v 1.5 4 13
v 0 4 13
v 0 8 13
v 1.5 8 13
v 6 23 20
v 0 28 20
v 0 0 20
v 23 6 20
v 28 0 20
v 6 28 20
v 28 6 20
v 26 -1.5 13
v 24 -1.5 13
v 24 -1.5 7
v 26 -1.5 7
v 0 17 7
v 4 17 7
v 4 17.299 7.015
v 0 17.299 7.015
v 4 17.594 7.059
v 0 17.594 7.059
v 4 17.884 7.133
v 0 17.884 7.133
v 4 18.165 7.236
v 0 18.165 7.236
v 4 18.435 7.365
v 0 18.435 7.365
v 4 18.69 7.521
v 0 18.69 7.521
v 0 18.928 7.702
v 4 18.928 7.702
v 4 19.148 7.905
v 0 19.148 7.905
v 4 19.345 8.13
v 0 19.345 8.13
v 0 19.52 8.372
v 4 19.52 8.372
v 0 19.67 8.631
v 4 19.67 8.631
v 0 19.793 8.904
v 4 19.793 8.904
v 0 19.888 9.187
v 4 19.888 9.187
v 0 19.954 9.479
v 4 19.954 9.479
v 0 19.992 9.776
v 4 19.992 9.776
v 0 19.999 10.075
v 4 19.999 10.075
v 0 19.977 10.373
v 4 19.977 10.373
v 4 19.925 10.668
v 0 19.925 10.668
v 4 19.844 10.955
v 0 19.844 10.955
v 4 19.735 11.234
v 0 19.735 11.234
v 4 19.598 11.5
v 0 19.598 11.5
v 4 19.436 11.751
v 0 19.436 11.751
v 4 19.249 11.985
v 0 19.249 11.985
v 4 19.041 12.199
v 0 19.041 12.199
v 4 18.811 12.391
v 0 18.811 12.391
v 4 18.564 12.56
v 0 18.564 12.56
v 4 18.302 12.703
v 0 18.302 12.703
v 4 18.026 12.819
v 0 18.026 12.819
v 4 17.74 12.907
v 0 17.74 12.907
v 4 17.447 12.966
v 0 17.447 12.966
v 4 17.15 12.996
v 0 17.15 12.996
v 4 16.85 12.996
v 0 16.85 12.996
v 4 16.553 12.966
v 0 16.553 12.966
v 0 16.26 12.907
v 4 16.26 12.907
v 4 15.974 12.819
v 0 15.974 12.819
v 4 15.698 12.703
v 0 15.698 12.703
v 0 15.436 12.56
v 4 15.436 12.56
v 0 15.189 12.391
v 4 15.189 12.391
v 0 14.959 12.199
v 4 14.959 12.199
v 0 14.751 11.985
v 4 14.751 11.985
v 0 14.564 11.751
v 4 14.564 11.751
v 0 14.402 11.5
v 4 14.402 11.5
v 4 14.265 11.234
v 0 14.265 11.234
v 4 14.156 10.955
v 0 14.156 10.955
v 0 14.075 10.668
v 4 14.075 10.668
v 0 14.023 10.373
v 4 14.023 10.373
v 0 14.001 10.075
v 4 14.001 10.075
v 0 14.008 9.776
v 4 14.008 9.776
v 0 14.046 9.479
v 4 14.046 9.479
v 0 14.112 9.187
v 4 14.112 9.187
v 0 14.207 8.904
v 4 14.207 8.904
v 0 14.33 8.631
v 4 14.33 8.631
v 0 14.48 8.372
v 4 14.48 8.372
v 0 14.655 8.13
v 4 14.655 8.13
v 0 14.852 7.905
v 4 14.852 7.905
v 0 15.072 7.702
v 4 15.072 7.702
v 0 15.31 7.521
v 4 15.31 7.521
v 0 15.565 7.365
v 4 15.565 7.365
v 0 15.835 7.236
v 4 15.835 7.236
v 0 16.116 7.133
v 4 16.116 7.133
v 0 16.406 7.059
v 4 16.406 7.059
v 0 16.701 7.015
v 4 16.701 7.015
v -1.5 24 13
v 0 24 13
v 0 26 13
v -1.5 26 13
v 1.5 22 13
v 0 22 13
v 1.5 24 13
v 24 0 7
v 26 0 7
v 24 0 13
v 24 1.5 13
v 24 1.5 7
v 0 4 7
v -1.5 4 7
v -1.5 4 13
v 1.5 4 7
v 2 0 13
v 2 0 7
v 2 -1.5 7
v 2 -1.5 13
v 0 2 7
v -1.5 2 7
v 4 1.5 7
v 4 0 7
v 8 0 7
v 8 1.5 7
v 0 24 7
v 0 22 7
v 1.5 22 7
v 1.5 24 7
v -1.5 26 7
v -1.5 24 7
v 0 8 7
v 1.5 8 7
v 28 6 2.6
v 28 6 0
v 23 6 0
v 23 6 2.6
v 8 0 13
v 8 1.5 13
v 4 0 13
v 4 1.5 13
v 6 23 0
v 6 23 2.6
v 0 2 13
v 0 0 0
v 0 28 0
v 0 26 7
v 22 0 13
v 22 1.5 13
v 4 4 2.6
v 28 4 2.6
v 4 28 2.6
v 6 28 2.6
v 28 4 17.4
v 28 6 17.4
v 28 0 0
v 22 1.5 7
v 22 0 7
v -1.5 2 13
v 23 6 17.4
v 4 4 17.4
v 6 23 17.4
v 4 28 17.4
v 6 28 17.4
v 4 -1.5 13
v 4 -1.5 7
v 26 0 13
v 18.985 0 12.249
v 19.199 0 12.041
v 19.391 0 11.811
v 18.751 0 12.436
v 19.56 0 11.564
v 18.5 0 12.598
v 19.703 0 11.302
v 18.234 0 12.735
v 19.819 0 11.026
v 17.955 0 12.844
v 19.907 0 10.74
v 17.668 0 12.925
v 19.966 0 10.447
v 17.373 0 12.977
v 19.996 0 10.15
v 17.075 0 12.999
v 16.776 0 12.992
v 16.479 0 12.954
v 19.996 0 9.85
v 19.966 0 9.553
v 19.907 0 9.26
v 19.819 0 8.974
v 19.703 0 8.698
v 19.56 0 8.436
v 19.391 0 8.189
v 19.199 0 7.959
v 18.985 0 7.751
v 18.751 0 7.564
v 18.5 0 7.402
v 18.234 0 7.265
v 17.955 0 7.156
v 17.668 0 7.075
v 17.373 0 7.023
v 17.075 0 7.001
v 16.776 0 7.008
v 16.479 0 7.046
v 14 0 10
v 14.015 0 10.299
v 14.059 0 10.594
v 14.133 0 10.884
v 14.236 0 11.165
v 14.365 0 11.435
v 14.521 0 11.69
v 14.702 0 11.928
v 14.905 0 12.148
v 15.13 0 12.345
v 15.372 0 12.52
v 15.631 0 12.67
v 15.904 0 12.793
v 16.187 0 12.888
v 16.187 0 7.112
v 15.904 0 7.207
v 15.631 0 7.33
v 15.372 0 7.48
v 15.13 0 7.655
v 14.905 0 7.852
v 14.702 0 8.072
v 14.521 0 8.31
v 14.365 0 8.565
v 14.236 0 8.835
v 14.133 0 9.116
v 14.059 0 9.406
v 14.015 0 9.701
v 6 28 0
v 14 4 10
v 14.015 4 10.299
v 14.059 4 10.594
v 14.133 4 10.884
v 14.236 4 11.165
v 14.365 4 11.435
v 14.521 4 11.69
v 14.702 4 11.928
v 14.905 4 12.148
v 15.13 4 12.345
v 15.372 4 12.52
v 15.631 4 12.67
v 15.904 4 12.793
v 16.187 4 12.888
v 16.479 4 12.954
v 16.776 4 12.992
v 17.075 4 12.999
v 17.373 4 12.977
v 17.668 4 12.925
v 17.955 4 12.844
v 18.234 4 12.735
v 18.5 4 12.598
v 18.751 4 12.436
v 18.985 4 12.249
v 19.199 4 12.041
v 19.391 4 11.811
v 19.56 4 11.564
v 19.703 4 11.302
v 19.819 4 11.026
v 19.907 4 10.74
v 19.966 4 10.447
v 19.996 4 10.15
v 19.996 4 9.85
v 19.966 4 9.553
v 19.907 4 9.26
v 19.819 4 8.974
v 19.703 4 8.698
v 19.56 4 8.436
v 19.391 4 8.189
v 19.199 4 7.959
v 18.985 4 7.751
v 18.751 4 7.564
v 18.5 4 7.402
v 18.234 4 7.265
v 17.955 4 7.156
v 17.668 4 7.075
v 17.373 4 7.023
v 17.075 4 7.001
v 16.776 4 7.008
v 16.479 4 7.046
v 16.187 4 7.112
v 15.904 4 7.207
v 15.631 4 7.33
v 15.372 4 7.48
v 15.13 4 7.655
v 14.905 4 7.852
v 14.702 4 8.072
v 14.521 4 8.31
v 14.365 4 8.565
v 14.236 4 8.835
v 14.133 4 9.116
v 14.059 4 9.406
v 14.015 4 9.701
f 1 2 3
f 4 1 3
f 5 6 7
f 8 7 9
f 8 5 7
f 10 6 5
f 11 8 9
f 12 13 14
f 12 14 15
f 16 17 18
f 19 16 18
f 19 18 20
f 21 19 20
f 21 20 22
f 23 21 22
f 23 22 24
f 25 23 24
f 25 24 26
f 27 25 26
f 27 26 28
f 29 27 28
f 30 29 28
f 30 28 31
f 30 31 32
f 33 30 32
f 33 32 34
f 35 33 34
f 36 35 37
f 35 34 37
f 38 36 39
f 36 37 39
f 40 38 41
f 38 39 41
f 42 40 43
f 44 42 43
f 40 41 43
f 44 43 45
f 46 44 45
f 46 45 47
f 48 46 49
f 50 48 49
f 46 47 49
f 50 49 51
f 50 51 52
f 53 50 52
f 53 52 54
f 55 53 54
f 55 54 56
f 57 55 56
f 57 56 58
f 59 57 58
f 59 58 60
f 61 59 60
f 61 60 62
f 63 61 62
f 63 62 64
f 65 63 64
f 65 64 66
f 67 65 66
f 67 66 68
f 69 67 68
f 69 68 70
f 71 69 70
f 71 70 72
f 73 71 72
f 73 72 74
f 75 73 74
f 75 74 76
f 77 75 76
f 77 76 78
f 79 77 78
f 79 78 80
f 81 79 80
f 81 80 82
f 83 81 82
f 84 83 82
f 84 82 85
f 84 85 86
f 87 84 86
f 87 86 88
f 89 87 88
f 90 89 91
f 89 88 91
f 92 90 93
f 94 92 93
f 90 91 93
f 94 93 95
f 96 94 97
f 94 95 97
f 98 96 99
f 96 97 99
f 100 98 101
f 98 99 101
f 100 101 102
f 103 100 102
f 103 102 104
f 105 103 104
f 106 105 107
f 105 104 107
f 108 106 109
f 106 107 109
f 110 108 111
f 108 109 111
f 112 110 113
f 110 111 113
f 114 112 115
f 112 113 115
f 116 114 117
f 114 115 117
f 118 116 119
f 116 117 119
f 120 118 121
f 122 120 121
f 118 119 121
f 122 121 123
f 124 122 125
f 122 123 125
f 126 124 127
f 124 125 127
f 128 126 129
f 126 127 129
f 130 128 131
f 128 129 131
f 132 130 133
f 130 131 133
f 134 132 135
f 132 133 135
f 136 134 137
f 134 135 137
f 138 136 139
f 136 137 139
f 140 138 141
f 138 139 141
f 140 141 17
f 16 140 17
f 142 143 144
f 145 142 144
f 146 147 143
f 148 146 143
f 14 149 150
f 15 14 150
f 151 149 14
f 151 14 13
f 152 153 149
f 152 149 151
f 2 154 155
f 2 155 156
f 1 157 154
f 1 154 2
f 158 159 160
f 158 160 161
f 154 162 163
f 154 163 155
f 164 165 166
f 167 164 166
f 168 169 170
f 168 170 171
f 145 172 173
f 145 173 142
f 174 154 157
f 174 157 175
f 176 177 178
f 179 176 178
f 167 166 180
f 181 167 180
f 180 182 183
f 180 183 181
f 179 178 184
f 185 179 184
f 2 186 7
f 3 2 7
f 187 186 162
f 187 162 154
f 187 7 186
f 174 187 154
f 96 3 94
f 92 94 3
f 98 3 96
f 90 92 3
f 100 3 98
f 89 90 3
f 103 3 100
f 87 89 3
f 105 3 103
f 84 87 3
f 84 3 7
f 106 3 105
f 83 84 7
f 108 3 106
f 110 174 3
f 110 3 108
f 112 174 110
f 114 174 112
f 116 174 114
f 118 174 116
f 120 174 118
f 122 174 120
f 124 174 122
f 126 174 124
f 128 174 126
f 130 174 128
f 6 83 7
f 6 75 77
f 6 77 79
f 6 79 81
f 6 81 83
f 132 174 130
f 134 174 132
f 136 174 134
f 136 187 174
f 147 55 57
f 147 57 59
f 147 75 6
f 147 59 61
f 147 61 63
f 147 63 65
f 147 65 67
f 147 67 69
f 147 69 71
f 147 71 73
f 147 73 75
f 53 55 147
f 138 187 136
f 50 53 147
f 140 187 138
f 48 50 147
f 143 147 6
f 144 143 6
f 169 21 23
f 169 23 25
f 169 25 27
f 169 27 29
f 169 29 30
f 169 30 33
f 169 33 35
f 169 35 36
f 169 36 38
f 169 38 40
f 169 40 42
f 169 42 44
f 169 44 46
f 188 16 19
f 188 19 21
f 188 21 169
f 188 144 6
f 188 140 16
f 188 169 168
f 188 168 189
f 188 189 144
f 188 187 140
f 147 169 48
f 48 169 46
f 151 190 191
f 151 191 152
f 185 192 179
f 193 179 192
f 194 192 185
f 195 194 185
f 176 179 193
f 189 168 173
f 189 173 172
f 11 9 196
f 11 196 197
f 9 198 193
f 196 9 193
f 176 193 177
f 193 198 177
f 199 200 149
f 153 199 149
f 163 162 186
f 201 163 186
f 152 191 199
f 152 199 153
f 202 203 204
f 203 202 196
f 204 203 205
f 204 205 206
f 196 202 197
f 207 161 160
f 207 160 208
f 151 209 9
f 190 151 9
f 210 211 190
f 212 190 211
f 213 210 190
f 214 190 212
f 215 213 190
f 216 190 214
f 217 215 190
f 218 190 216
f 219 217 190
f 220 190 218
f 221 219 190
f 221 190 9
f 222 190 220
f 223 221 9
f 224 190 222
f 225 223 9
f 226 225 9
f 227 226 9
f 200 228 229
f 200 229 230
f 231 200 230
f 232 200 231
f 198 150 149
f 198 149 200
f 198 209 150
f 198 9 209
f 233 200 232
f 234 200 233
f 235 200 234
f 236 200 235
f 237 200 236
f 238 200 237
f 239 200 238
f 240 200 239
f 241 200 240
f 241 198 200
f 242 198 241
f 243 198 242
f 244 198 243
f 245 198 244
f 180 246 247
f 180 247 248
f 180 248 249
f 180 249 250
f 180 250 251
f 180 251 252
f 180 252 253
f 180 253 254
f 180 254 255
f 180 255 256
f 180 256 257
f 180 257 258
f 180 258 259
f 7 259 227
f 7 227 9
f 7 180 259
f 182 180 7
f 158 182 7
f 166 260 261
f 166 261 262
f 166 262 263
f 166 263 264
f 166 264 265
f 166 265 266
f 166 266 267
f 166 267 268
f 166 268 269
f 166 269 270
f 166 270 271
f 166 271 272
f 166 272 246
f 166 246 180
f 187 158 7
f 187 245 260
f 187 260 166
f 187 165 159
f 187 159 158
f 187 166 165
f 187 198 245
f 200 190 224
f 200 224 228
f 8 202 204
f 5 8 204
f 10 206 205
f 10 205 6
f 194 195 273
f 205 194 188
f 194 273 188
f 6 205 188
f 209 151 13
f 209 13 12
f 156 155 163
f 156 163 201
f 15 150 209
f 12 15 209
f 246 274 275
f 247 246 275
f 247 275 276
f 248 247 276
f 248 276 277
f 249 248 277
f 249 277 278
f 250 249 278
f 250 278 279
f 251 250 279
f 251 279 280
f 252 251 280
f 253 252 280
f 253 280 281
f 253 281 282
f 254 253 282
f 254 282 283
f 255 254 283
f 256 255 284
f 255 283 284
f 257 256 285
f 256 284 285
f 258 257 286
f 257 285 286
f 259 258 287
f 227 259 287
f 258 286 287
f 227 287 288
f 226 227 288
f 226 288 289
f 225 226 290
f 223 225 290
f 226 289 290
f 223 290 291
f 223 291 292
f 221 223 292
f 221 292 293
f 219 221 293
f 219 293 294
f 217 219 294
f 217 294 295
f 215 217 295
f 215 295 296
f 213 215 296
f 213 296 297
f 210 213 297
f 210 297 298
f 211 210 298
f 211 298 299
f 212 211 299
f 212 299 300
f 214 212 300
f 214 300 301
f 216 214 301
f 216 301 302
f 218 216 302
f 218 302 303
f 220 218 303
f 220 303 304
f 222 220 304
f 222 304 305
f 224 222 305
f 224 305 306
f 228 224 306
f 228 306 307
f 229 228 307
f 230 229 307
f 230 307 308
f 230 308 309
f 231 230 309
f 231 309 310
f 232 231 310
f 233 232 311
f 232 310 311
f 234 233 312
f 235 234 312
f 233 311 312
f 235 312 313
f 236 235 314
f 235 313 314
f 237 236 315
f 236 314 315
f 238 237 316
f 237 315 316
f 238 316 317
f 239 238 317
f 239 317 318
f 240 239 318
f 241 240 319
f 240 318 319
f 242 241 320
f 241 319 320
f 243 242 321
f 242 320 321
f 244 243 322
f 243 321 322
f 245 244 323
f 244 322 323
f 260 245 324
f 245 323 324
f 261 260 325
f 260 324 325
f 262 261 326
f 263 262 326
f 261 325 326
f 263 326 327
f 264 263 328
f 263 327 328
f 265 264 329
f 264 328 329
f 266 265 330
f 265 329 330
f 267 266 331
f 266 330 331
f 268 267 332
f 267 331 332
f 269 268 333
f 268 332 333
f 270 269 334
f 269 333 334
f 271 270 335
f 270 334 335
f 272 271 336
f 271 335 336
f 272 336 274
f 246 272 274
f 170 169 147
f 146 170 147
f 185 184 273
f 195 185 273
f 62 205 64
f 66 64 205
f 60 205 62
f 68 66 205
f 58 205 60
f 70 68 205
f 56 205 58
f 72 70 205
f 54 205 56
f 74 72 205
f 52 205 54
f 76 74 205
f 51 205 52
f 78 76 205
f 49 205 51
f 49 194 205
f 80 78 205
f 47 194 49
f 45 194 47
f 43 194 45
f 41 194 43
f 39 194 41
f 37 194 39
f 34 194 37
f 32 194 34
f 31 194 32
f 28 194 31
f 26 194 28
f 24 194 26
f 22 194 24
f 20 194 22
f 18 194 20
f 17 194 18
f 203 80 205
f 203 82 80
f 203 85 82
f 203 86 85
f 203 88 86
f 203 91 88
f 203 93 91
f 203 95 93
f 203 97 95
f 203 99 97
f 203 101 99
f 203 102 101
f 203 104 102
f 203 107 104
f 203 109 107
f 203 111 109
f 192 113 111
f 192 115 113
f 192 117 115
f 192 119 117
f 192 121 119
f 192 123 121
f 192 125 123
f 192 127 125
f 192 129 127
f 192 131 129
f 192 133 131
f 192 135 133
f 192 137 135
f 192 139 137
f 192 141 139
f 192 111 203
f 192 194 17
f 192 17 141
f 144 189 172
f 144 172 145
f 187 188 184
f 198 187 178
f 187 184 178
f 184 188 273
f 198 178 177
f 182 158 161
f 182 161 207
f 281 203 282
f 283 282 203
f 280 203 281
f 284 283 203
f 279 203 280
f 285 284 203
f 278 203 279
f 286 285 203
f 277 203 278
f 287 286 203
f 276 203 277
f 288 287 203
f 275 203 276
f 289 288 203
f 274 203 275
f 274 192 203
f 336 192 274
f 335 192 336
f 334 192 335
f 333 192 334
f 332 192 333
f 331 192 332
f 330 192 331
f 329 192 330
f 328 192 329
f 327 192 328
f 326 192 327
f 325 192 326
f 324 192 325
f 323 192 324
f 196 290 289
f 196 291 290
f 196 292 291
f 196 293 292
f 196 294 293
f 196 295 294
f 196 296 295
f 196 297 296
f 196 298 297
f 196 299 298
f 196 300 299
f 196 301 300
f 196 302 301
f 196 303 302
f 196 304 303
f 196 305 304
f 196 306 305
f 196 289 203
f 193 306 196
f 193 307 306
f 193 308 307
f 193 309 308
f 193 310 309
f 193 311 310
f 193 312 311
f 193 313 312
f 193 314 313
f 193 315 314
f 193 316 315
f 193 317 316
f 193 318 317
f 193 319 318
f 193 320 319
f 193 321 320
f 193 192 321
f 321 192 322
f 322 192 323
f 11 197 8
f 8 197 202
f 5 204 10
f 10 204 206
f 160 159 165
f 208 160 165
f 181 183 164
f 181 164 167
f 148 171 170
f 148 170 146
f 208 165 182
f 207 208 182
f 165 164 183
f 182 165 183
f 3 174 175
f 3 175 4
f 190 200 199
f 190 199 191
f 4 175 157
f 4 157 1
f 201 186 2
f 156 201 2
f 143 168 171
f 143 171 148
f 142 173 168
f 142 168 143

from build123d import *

# Parameters (mm, degrees)
EXTRUDE_1_DEPTH     = 20
SKETCH_2_R          = 3
CUT_EXTRUDE_1_DEPTH = 42.952353927
SKETCH_3_R          = 3
CUT_EXTRUDE_2_DEPTH = 42.952353927
SKETCH_4_W          = 2
SKETCH_4_H          = 6
EXTRUDE_1_2_DEPTH   = 1.5
SKETCH_5_W          = 4
SKETCH_5_H          = 6
CUT_EXTRUDE_3_DEPTH = 1.5
SKETCH_6_W          = 6
SKETCH_6_H          = 2
EXTRUDE_2_DEPTH     = 1.5
SKETCH_7_W          = 6
SKETCH_7_H          = 4
CUT_EXTRUDE_4_DEPTH = 1.5
SKETCH_8_W          = 6
SKETCH_8_H          = 2
EXTRUDE_3_DEPTH     = 1.5
SKETCH_10_W         = 6
SKETCH_10_H         = 2
CUT_EXTRUDE_6_DEPTH = 1.5
SKETCH_11_W         = 2
SKETCH_11_H         = 6
EXTRUDE_4_DEPTH     = 1.5
SKETCH_12_W         = 2
SKETCH_12_H         = 6
CUT_EXTRUDE_7_DEPTH = 1.5
RIB_1_DEPTH         = 2.6
RIB_START           = -2.6
RIB_2_DEPTH         = 2.6


# Read off the part's stored shape, not the designer's step: 筋1, 筋2
with BuildPart() as part:
    # 草图1 → Extrude 1 (new body)
    with BuildSketch(Plane.XY):
        Polygon((28, 0), (0, 0), (0, 28), (4, 28), (4, 4), (28, 4), align=None)
    extrude(amount=EXTRUDE_1_DEPTH)

    # 草图2 → 切除-拉伸1 (cut, through all)
    with BuildSketch(Plane(origin=(0, 4, 0), x_dir=(1, 0, 0), z_dir=(0, 1, 0))):
        with Locations(Location((17, -10, 0), (0, 0, 180))):
            Circle(SKETCH_2_R)
    extrude(amount=-CUT_EXTRUDE_1_DEPTH, mode=Mode.SUBTRACT)

    # 草图3 → 切除-拉伸2 (cut, through all)
    with BuildSketch(Plane(origin=(4, 0, 0), x_dir=(0, 0, -1), z_dir=(1, 0, 0))):
        with Locations((-10, 17)):
            Circle(SKETCH_3_R)
    extrude(amount=-CUT_EXTRUDE_2_DEPTH, mode=Mode.SUBTRACT)

    # 草图4 → Extrude 1 2 (add)
    with BuildSketch(Plane.XZ):
        with Locations((3, 10)):
            Rectangle(SKETCH_4_W, SKETCH_4_H)
    extrude(amount=EXTRUDE_1_2_DEPTH)

    # 草图5 → 切除-拉伸3 (cut)
    with BuildSketch(Plane.XZ):
        with Locations((6, 10)):
            Rectangle(SKETCH_5_W, SKETCH_5_H)
    extrude(amount=-CUT_EXTRUDE_3_DEPTH, mode=Mode.SUBTRACT)

    # 草图6 → 凸台-拉伸2 (add)
    with BuildSketch(Plane.ZY):
        with Locations((10, 3)):
            Rectangle(SKETCH_6_W, SKETCH_6_H)
    extrude(amount=EXTRUDE_2_DEPTH)

    # 草图7 → 切除-拉伸4 (cut)
    with BuildSketch(Plane.ZY):
        with Locations((10, 6)):
            Rectangle(SKETCH_7_W, SKETCH_7_H)
    extrude(amount=-CUT_EXTRUDE_4_DEPTH, mode=Mode.SUBTRACT)

    # 草图8 → 凸台-拉伸3 (add)
    with BuildSketch(Plane.ZY):
        with Locations((10, 25)):
            Rectangle(SKETCH_8_W, SKETCH_8_H)
    extrude(amount=EXTRUDE_3_DEPTH)

    # 草图10 → 切除-拉伸6 (cut)
    with BuildSketch(Plane.ZY):
        with Locations((10, 23)):
            Rectangle(SKETCH_10_W, SKETCH_10_H)
    extrude(amount=-CUT_EXTRUDE_6_DEPTH, mode=Mode.SUBTRACT)

    # 草图11 → 凸台-拉伸4 (add)
    with BuildSketch(Plane.XZ):
        with Locations((25, 10)):
            Rectangle(SKETCH_11_W, SKETCH_11_H)
    extrude(amount=EXTRUDE_4_DEPTH)

    # 草图12 → 切除-拉伸7 (cut)
    with BuildSketch(Plane.XZ):
        with Locations((23, 10)):
            Rectangle(SKETCH_12_W, SKETCH_12_H)
    extrude(amount=-CUT_EXTRUDE_7_DEPTH, mode=Mode.SUBTRACT)

    # 筋1 outline → 筋1 (add)
    with BuildSketch(Plane.XY):
        Polygon((6, 23), (6, 28), (4, 28), (4, 4), (28, 4), (28, 6), (23, 6), align=None)
    extrude(amount=RIB_1_DEPTH)

    # 筋2 outline → 筋2 (add)
    with BuildSketch(Plane.XY.offset(20).offset(RIB_START)):
        Polygon((6, 23), (6, 28), (4, 28), (4, 4), (28, 4), (28, 6), (23, 6), align=None)
    extrude(amount=RIB_2_DEPTH)


solid = part.part
